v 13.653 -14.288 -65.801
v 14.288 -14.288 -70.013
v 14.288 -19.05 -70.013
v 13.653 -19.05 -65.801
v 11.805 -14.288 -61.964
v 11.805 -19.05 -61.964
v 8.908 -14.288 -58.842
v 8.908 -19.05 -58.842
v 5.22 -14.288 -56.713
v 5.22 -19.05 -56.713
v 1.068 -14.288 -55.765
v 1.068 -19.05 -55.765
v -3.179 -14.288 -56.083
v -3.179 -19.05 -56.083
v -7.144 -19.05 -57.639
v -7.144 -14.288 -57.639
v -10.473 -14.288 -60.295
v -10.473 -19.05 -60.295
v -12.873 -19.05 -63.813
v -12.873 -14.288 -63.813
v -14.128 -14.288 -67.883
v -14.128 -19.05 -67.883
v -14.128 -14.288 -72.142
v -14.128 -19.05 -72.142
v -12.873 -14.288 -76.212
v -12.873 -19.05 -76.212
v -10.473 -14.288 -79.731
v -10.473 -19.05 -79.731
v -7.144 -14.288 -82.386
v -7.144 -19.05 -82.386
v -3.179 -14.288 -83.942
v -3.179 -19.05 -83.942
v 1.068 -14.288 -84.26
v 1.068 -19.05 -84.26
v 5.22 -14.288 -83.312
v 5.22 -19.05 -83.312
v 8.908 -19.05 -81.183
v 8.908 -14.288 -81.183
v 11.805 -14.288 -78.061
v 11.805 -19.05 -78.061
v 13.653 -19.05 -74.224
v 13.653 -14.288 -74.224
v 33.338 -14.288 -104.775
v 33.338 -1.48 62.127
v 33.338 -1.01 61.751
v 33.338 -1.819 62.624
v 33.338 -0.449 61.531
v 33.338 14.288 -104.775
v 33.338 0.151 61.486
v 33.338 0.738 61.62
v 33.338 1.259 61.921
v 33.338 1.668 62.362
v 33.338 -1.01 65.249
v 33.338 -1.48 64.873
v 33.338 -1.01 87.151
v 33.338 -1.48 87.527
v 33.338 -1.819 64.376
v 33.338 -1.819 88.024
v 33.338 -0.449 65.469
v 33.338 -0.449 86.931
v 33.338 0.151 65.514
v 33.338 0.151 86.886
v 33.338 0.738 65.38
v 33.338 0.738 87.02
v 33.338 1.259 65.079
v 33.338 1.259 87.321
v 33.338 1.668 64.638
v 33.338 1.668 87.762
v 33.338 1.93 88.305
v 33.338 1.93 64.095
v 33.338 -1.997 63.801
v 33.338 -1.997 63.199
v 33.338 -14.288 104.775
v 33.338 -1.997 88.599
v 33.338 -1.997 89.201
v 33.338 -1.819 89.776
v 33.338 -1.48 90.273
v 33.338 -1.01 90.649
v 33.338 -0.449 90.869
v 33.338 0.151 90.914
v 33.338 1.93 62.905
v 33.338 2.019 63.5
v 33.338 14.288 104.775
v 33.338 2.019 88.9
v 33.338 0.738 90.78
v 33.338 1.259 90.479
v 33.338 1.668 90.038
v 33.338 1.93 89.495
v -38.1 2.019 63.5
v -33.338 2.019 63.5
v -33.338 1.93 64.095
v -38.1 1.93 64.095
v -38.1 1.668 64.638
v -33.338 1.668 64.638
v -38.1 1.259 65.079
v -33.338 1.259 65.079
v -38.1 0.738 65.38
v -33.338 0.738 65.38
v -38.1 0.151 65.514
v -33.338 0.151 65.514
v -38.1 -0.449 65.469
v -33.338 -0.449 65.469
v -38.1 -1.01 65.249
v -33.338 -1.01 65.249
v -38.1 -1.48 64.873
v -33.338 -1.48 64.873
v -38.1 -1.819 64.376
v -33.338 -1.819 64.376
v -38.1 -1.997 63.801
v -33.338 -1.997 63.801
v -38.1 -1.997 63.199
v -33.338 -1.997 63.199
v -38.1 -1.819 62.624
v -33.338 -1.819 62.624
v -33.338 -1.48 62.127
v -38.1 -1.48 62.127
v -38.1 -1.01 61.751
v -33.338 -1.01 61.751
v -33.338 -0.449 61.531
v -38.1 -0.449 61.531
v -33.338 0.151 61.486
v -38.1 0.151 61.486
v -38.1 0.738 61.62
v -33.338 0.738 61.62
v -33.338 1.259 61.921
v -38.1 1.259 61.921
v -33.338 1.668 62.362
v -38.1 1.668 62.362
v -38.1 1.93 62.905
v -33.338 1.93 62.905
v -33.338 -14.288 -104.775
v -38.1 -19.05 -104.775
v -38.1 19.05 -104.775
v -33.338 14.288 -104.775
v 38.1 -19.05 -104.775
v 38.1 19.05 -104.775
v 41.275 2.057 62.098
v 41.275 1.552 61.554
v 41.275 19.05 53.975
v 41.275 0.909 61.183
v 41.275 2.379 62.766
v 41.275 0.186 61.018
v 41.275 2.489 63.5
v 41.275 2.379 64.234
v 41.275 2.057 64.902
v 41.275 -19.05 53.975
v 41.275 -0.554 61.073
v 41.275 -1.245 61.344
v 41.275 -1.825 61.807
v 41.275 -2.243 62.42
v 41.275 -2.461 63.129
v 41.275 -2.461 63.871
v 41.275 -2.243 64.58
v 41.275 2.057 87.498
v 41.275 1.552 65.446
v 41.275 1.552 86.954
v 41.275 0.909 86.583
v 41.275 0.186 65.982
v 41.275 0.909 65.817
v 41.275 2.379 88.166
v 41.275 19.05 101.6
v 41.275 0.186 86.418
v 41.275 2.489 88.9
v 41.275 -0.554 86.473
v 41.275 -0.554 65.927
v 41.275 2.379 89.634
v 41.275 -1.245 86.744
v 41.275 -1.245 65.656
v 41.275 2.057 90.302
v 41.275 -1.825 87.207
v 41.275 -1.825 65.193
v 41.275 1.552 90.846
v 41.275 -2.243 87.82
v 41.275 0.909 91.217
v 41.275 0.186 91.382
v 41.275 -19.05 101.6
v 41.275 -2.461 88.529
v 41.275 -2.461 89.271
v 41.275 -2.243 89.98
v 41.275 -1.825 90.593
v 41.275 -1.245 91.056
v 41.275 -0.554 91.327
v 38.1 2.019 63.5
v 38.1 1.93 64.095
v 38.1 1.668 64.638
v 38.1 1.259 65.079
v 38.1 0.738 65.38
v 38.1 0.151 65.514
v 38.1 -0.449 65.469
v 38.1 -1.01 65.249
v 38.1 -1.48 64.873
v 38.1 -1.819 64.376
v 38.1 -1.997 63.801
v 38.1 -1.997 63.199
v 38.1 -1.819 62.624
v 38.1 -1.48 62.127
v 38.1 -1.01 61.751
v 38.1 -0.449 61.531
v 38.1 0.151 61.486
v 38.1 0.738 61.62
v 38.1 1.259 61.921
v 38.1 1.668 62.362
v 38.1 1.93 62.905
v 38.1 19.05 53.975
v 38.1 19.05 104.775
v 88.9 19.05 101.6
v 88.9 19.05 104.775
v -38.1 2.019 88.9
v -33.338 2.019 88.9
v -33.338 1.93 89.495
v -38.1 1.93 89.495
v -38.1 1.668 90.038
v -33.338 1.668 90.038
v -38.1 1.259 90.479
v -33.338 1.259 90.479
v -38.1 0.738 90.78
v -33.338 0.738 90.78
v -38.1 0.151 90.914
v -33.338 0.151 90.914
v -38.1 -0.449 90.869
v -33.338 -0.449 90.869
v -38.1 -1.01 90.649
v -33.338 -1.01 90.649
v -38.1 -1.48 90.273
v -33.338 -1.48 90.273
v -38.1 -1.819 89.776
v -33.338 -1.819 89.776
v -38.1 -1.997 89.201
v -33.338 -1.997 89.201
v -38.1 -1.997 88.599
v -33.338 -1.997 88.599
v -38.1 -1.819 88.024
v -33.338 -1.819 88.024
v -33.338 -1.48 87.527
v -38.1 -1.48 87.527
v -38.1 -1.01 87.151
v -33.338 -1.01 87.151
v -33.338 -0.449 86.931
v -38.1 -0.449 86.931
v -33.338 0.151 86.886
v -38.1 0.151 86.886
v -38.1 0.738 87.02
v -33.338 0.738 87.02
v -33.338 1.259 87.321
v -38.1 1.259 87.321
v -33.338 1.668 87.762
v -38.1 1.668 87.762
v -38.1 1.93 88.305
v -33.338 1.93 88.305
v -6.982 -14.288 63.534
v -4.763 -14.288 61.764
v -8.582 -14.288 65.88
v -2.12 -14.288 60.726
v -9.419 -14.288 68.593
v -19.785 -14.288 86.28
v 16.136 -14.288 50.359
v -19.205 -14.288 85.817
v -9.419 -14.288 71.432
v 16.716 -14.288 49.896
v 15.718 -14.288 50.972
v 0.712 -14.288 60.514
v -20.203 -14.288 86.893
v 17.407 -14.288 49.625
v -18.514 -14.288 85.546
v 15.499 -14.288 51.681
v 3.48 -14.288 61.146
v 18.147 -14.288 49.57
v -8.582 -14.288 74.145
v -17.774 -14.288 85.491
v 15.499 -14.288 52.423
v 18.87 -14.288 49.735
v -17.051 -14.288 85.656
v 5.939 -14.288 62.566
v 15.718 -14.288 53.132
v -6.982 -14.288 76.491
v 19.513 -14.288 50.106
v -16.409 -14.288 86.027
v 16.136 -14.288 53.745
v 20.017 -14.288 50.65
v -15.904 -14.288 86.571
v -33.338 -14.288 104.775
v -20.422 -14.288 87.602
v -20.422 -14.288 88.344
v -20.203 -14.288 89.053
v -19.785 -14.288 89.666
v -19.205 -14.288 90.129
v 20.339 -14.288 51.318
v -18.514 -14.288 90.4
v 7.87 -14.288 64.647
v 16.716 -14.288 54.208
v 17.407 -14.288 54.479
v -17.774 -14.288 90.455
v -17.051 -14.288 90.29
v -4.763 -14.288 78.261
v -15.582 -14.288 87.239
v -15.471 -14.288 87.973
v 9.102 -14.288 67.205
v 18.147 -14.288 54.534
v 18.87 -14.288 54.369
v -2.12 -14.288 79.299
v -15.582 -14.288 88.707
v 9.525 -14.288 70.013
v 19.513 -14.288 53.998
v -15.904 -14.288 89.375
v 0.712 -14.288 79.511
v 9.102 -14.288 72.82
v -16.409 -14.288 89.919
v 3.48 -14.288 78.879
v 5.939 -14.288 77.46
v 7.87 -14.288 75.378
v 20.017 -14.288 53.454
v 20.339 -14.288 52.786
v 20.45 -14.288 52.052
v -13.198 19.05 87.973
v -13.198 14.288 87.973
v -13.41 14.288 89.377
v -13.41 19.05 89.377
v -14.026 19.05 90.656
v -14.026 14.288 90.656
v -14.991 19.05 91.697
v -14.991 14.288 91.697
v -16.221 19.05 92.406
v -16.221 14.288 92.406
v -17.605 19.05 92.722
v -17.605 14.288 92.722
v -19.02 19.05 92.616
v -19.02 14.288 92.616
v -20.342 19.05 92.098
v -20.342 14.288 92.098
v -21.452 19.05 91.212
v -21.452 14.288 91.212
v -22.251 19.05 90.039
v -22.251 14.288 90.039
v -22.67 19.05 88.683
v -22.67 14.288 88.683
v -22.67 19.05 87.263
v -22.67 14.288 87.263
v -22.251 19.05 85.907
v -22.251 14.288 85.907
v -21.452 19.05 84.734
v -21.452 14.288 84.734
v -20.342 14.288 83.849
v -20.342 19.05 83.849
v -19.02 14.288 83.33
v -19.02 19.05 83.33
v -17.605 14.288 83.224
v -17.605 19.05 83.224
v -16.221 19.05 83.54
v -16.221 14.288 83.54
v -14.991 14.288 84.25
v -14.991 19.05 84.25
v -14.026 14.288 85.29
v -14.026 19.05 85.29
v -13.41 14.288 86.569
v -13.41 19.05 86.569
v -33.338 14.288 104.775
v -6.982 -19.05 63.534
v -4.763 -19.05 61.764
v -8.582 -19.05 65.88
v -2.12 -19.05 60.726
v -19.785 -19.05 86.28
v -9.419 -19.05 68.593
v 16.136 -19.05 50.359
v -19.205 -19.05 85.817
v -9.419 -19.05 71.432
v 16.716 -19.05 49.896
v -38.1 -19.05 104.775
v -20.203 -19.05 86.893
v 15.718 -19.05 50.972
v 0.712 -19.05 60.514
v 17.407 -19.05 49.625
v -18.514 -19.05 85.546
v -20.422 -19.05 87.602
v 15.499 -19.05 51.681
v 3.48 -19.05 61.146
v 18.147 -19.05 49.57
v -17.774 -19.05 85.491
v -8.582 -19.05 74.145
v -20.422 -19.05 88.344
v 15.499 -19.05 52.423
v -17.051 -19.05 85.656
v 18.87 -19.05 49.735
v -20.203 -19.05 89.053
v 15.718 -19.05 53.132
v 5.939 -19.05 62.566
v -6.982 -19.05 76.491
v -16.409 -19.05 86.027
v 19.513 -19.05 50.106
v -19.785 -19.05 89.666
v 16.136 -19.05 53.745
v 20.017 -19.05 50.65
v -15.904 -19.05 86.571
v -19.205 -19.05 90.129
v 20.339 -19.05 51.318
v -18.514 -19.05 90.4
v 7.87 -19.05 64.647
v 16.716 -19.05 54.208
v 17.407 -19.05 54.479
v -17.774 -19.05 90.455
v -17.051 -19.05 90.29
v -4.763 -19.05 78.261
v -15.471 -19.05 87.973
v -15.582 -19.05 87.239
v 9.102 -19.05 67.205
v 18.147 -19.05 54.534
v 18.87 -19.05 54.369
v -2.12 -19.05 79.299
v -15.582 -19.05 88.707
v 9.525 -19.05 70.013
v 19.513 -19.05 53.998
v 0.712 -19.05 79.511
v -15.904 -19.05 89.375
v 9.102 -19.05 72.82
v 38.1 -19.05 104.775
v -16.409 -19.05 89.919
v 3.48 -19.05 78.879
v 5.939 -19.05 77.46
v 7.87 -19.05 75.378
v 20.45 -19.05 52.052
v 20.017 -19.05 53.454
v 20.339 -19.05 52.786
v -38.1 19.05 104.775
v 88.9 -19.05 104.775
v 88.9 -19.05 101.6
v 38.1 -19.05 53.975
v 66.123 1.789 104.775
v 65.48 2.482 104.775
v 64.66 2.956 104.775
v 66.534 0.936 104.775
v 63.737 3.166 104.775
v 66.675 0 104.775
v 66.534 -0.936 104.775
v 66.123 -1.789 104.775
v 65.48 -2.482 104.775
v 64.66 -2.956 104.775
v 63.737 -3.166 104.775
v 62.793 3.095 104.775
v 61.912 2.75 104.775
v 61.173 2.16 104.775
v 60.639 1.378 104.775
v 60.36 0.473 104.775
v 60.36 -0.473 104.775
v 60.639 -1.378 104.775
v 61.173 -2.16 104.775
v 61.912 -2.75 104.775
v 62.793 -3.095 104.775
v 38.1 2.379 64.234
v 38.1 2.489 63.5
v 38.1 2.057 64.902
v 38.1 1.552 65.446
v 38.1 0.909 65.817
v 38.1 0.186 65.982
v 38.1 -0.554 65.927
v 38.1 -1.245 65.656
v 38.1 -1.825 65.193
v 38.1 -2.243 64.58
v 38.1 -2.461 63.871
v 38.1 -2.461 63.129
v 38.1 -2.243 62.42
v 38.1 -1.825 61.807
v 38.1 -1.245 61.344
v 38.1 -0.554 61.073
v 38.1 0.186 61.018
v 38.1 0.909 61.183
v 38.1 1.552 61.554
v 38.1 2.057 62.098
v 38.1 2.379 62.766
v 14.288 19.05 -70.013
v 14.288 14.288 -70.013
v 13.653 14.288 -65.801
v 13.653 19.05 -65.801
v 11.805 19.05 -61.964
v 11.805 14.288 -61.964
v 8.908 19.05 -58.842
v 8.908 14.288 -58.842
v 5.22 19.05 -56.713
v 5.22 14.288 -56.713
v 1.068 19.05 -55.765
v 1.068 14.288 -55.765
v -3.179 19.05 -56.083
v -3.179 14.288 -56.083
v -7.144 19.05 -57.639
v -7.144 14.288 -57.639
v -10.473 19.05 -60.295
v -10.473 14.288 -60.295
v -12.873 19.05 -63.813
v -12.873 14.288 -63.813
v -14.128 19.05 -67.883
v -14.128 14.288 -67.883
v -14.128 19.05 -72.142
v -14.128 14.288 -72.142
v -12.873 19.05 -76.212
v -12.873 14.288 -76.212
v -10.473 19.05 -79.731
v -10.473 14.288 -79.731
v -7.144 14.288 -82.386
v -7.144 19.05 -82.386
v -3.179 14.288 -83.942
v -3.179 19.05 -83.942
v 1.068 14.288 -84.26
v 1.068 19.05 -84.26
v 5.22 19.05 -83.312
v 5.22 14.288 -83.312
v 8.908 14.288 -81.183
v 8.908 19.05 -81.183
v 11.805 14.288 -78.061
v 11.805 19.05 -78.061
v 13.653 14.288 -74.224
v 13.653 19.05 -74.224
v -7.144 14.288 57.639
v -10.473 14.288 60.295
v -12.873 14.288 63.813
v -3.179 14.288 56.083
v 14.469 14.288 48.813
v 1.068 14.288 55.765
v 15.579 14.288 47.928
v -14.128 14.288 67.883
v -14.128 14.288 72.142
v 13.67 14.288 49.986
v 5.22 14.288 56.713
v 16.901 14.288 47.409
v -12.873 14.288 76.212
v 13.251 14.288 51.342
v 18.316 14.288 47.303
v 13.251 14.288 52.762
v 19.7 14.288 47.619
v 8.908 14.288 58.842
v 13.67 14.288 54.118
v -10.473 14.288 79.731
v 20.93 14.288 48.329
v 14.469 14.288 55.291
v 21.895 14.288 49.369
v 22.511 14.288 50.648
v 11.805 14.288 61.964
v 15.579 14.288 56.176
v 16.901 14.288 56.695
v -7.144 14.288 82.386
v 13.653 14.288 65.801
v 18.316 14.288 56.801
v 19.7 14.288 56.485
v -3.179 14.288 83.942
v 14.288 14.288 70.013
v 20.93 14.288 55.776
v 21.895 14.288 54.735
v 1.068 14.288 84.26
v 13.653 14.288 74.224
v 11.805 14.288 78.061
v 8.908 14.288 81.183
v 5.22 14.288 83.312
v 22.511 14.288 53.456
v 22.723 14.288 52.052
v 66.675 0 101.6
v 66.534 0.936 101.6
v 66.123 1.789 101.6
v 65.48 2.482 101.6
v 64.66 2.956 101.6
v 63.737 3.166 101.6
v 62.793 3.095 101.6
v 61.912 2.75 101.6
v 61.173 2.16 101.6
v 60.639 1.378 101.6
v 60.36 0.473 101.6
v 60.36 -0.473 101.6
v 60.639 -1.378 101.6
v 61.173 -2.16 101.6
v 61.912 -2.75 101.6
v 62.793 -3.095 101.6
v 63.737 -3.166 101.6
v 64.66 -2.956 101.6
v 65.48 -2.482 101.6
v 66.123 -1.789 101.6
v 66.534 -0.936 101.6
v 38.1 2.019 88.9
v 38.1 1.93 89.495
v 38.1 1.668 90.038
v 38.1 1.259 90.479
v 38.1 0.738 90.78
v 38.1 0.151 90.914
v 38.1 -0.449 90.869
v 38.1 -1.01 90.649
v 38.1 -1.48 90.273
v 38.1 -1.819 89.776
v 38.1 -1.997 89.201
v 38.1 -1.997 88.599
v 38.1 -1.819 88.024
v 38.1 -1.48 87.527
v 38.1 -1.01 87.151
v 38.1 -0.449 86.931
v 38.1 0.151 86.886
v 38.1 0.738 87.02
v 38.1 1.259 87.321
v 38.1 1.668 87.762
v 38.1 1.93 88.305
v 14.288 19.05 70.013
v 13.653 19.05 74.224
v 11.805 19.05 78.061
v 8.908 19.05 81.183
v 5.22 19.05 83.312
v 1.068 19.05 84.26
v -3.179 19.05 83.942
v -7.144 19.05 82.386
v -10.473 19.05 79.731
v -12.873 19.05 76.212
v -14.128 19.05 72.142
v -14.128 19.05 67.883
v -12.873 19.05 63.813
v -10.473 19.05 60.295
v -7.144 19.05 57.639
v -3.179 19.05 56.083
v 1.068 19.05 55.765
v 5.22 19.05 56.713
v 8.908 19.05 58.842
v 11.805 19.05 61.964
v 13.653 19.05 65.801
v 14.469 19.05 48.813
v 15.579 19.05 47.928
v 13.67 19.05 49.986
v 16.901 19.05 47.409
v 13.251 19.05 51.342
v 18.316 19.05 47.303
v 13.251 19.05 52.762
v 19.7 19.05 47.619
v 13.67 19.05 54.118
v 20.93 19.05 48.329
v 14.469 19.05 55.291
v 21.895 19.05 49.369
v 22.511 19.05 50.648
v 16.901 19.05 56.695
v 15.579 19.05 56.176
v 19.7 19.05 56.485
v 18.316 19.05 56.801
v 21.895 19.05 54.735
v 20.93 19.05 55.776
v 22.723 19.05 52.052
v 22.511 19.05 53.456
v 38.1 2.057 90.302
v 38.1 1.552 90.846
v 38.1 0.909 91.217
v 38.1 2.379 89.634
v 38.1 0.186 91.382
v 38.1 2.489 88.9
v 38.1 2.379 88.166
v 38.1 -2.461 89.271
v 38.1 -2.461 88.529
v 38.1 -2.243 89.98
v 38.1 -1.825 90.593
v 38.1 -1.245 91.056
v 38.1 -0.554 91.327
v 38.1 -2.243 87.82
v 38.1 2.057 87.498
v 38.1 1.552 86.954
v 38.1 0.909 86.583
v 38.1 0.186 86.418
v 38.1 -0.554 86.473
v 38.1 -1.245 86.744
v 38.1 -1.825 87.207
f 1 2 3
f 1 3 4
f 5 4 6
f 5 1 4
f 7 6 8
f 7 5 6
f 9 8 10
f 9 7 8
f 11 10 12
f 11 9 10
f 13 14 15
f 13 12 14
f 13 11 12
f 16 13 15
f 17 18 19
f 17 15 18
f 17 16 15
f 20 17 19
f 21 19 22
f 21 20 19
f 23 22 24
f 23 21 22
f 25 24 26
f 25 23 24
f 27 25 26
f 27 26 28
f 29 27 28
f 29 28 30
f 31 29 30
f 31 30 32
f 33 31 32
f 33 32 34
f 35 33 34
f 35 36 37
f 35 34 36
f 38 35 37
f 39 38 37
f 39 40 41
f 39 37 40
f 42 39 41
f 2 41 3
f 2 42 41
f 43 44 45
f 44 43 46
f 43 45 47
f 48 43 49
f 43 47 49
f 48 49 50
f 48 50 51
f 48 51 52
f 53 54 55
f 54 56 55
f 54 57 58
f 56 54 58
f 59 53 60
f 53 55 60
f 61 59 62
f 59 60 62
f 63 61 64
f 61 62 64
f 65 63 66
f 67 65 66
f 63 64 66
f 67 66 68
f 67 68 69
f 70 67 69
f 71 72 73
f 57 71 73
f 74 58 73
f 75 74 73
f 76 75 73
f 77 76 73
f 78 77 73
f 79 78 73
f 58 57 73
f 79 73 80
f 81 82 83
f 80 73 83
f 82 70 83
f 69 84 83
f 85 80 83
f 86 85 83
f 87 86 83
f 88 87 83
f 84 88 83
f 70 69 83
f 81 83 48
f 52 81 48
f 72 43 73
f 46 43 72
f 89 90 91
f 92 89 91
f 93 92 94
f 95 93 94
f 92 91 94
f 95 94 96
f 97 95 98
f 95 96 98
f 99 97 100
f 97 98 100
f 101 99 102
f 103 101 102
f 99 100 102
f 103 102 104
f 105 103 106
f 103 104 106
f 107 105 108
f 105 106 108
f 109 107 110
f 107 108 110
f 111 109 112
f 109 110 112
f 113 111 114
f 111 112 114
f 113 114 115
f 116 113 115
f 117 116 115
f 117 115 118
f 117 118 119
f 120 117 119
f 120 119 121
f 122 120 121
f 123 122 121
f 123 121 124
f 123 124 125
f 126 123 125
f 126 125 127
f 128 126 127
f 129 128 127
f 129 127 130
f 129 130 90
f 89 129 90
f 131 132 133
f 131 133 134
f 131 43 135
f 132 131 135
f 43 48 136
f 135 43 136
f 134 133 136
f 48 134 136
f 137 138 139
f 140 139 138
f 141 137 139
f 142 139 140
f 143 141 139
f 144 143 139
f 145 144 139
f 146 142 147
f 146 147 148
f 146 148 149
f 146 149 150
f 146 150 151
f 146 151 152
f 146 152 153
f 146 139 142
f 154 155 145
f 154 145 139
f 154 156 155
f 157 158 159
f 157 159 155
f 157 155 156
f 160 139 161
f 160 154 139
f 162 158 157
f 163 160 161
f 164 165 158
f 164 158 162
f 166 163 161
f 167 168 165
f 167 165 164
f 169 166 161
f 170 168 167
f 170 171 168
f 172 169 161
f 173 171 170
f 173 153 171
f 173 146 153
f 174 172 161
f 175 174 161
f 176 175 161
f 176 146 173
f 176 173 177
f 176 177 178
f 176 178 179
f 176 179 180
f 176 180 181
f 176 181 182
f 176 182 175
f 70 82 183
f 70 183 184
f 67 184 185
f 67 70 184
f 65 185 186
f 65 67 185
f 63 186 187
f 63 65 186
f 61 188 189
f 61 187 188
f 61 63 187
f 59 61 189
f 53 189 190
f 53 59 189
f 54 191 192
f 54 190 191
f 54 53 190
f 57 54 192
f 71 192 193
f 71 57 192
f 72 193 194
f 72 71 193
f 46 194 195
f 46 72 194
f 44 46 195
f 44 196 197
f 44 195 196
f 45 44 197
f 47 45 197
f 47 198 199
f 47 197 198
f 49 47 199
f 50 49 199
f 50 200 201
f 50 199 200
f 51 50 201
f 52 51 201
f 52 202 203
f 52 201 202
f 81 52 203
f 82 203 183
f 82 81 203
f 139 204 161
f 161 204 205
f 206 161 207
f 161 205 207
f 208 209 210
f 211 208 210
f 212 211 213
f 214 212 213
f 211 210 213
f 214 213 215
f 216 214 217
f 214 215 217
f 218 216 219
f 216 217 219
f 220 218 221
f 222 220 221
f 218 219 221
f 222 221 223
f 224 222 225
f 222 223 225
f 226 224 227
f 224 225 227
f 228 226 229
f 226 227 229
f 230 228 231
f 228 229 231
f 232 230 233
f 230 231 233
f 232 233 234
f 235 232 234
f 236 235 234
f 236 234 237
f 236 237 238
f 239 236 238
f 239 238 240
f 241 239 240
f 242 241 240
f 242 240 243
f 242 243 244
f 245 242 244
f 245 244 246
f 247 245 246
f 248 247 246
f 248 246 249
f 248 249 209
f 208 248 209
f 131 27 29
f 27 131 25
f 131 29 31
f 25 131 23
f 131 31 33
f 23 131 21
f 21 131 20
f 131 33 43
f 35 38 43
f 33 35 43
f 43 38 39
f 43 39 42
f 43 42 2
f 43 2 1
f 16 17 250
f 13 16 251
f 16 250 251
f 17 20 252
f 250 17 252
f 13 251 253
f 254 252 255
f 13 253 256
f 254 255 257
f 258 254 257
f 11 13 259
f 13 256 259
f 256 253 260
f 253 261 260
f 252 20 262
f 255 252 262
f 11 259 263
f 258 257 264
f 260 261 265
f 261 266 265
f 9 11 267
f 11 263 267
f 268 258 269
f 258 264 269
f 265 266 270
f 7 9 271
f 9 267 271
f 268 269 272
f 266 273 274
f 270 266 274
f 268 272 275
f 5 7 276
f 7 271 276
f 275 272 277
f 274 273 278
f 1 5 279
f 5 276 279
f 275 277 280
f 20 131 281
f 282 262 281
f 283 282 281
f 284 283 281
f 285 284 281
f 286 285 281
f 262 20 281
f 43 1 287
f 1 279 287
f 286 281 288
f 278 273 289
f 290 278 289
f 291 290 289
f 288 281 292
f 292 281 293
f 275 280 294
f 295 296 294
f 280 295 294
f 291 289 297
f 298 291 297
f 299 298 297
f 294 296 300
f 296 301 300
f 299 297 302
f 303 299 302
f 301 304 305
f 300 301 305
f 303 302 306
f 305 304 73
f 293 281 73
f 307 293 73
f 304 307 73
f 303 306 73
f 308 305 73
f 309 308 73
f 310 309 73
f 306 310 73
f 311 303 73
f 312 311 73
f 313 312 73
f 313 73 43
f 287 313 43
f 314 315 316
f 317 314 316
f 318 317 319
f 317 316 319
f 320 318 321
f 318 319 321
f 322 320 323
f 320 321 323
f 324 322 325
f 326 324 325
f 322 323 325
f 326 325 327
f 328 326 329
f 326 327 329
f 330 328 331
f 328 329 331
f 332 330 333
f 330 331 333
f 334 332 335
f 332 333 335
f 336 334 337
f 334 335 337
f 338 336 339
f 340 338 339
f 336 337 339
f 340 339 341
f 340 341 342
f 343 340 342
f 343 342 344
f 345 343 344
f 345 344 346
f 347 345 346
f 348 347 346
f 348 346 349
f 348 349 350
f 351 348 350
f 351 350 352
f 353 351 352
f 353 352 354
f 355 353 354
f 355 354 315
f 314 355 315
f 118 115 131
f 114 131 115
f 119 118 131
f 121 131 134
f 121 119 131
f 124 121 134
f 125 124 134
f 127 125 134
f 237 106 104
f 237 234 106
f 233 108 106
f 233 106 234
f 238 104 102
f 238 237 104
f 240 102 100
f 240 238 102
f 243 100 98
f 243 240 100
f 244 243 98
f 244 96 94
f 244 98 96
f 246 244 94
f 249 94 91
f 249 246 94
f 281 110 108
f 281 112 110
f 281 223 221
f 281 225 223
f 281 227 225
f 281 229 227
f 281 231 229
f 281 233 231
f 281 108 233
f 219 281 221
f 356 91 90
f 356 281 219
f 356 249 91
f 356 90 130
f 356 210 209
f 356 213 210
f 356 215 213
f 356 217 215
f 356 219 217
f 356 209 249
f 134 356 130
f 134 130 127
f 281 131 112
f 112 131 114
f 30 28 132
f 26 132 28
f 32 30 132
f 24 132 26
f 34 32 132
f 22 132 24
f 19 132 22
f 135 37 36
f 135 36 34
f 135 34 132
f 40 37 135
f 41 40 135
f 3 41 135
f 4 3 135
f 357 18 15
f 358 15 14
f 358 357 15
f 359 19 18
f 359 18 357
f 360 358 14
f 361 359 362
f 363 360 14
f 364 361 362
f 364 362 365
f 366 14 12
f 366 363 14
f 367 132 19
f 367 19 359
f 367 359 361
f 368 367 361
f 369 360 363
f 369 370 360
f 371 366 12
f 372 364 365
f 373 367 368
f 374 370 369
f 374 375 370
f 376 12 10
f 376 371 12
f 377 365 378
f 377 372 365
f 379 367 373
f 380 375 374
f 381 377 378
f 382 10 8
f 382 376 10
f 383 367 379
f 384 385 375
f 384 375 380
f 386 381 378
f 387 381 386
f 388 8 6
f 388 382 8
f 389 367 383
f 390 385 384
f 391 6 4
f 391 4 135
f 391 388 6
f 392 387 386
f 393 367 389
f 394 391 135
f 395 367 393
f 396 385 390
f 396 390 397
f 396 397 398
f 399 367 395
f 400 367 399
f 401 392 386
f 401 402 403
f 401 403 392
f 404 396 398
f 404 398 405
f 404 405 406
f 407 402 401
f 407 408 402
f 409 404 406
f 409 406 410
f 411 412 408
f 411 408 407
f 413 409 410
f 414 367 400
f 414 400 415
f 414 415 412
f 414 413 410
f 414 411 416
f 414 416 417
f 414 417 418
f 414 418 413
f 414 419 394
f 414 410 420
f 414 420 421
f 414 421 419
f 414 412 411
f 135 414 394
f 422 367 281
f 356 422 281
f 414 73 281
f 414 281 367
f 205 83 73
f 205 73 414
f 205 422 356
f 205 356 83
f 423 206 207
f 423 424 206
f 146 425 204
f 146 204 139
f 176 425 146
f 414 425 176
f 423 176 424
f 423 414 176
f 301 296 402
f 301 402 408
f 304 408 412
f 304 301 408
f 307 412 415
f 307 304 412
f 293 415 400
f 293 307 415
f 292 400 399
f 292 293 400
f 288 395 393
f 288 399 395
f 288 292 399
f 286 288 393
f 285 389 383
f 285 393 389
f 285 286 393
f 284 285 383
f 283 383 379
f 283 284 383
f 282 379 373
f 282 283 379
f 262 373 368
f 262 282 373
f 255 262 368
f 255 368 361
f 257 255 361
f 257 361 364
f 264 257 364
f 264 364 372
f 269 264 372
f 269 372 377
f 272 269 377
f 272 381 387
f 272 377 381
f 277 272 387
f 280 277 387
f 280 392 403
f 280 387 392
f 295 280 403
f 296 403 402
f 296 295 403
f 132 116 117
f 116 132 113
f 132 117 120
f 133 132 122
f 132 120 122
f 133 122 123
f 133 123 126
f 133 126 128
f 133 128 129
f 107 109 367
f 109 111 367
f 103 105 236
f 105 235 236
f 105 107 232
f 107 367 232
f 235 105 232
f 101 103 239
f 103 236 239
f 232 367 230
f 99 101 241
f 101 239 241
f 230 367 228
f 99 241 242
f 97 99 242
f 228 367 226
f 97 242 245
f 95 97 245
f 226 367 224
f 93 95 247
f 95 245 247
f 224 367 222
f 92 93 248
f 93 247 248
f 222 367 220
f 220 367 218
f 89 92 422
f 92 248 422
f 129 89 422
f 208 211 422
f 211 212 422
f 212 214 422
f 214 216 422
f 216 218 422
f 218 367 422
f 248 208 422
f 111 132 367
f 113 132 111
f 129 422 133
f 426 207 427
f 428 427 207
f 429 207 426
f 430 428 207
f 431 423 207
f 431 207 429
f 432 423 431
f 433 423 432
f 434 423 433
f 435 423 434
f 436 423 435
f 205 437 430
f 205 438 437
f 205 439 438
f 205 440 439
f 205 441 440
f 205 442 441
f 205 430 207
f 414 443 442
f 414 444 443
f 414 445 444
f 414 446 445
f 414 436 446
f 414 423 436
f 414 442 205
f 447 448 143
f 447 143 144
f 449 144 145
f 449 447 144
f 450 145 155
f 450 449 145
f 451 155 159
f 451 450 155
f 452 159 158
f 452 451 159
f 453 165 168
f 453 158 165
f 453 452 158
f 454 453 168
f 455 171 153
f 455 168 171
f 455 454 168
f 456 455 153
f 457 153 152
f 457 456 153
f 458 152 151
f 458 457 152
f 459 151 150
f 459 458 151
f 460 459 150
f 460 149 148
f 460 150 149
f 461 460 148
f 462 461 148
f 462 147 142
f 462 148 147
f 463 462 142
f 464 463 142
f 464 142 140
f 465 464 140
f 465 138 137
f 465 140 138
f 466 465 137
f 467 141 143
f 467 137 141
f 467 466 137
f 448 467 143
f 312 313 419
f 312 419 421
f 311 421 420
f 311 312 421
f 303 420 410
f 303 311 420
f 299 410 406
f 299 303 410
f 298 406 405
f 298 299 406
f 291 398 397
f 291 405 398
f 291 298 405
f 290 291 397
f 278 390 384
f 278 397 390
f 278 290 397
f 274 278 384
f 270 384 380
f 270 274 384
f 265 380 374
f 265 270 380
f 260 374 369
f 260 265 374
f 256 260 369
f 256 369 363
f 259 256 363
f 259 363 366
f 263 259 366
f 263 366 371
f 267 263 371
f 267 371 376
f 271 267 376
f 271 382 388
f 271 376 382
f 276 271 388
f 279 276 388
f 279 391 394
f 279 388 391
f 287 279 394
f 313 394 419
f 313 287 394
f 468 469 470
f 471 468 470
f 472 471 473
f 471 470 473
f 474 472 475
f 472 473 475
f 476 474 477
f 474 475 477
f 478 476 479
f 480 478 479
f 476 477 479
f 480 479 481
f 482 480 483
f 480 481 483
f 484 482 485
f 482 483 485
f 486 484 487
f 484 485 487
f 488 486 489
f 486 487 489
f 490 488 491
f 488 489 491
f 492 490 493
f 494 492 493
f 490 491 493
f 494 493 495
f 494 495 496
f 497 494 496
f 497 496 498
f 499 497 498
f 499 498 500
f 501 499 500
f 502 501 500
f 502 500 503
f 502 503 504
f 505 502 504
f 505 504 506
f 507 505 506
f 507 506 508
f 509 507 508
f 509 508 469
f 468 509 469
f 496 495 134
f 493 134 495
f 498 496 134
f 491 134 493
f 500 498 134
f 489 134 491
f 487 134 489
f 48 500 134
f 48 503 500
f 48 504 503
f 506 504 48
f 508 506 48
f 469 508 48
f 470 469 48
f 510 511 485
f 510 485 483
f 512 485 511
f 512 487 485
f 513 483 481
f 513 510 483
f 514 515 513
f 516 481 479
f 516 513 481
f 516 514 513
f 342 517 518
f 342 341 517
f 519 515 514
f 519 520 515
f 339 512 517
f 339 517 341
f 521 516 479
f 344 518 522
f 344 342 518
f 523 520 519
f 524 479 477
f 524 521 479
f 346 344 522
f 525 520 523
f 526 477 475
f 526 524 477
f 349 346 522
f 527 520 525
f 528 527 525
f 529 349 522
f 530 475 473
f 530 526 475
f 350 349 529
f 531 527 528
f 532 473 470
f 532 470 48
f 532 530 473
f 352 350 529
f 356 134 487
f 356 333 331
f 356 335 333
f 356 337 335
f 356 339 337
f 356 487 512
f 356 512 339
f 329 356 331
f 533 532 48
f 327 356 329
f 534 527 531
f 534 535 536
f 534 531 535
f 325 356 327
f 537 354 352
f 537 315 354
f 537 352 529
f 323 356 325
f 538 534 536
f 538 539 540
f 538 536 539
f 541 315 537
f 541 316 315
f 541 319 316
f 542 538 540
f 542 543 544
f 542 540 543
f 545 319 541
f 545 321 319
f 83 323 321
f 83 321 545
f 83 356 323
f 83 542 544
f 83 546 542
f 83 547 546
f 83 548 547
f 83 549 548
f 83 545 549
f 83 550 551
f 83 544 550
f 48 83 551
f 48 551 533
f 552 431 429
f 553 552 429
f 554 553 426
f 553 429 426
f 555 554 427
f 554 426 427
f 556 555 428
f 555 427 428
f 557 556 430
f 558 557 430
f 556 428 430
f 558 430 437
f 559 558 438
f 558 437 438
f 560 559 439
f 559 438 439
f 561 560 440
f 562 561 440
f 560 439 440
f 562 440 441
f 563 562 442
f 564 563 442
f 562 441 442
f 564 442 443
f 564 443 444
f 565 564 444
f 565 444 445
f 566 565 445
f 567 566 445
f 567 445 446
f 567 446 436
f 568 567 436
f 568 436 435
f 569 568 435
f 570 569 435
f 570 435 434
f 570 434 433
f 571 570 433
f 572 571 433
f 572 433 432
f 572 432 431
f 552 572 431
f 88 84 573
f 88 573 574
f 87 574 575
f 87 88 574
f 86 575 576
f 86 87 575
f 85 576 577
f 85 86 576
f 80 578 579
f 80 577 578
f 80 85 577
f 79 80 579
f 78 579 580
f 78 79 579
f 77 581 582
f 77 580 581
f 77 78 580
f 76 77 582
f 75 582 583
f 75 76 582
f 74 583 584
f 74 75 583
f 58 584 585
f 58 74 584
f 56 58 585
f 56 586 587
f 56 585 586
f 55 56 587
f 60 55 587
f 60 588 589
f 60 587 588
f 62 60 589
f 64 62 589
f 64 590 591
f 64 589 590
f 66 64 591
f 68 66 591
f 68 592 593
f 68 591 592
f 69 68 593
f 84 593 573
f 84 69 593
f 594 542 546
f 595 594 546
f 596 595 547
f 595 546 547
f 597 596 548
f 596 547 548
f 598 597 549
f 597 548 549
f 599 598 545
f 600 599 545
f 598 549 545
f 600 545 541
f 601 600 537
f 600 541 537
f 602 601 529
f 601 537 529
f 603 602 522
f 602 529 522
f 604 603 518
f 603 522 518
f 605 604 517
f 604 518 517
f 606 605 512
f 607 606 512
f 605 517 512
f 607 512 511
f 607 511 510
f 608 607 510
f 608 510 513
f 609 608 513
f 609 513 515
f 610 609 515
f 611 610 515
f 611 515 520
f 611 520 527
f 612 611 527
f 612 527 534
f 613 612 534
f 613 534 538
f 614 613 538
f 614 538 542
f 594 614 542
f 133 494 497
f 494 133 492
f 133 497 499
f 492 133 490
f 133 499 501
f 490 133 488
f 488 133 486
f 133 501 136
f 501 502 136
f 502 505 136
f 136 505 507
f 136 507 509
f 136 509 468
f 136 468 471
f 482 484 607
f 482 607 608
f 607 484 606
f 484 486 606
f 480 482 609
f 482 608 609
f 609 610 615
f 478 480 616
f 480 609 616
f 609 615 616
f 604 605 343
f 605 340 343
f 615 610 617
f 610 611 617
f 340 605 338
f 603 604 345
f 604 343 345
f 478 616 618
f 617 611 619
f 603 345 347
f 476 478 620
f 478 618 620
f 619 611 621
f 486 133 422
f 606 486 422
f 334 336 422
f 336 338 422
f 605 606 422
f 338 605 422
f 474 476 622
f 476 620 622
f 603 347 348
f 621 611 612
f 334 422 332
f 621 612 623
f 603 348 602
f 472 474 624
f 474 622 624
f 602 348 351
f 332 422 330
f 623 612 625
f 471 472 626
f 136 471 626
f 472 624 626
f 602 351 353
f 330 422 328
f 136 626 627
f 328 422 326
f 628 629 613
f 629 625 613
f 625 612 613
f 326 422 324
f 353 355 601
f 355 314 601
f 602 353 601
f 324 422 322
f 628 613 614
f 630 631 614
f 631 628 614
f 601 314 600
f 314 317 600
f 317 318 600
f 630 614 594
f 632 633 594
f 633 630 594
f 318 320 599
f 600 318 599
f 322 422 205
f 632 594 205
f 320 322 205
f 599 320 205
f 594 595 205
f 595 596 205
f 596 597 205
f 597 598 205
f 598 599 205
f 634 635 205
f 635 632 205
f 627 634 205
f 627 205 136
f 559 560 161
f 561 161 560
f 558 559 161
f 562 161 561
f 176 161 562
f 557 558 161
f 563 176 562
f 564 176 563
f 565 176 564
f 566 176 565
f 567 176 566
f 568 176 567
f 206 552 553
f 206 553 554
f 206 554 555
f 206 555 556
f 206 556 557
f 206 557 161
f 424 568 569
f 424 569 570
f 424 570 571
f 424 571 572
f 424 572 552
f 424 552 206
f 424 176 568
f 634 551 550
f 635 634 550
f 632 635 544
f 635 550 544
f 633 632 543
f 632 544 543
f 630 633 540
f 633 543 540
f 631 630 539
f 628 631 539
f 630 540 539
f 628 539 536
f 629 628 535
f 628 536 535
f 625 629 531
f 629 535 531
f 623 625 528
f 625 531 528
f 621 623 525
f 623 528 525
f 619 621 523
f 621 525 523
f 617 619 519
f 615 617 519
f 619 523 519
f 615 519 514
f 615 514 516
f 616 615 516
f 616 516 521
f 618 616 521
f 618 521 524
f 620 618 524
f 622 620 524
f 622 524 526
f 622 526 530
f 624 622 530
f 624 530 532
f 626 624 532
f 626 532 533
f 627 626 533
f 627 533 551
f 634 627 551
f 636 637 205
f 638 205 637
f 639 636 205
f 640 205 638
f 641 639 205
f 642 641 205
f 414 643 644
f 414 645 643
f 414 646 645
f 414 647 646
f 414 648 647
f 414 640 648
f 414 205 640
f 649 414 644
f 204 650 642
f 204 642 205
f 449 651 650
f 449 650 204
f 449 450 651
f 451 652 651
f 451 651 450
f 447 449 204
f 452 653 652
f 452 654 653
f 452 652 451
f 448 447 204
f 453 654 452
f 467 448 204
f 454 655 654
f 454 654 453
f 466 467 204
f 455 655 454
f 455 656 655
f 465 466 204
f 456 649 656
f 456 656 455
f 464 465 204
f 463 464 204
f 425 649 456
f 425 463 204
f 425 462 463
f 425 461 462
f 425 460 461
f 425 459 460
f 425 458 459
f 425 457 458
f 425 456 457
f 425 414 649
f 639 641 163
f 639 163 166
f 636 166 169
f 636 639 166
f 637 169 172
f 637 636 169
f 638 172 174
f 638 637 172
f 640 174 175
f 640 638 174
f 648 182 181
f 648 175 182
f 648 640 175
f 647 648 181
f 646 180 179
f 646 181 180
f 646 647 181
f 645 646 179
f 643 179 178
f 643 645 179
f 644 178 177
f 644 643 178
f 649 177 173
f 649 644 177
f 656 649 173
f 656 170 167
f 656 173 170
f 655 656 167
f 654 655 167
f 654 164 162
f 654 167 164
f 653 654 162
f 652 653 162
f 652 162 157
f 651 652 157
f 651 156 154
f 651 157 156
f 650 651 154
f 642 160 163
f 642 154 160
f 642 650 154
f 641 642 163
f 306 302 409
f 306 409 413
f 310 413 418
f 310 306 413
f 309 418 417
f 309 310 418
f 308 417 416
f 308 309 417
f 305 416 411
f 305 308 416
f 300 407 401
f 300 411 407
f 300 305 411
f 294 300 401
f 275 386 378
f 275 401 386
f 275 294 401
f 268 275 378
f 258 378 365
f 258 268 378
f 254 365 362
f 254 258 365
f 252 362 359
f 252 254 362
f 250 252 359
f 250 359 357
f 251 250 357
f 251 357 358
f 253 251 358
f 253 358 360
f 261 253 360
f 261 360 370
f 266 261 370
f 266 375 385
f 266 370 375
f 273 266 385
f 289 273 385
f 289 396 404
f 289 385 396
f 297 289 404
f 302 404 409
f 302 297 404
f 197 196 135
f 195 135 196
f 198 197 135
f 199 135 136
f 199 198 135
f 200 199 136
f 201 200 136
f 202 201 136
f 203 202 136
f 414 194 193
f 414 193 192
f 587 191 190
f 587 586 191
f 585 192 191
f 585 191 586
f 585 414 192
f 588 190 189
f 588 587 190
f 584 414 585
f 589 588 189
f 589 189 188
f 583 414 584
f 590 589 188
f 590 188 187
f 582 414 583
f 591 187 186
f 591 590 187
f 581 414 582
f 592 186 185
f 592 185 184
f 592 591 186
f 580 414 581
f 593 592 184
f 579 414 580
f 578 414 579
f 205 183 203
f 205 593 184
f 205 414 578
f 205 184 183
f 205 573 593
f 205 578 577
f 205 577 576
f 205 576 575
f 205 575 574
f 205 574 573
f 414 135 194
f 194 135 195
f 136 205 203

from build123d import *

# Parameters (mm, degrees)
F0_W          = 76.2
F0_H          = 38.1
F1_DEPTH      = 104.775
F2_T          = -4.7625
F3_R          = 9.525
F3_R_2        = 2.4892
F3_R_3        = 14.2875
F4_DEPTH      = 19.051
F3_R_4        = 4.7625
F5_DEPTH      = 25.4
F7_DEPTH      = 19.05
F8_R          = 2.0193
F9_DEPTH      = 38.101
F9_DEPTH_BACK = 88.901
F10_R         = 3.175
F11_DEPTH     = 209.551
F8_R_2        = 2.4892
F12_DEPTH     = 88.901


with BuildPart() as f1:
    # F0 (on Top) → F1 (new body, symmetric)
    with BuildSketch(Plane.XY):
        Rectangle(F0_W, F0_H)
    extrude(amount=F1_DEPTH, both=True)

    # F2
    f2_openings = [f1.faces().sort_by_distance(p)[0] for p in [
        (0, 0, 104.775),
        (0, 0, -104.775),
    ]]
    offset(amount=F2_T, openings=f2_openings)

    # F3 (on Front) → F4 (cut, through all)
    with BuildSketch(Plane.XZ):
        with Locations((0, 70.01256)):
            Circle(F3_R)
        with Locations((-17.9605122421, 87.9730722421)):
            Circle(F3_R_2)
        with Locations((17.9605122421, 52.0520477579)):
            Circle(F3_R_2)
        with Locations((0, -70.01256)):
            Circle(F3_R_3)
    extrude(amount=F4_DEPTH, mode=Mode.SUBTRACT)

    # F3 (on Front) → F5 (cut)
    with BuildSketch(Plane.XZ):
        with Locations((0, 70.01256)):
            Circle(F3_R_3)
        with Locations((0, 70.01256)):
            Circle(F3_R, mode=Mode.SUBTRACT)
        with Locations((0, -70.01256)):
            Circle(F3_R_3)
        with Locations((0, 70.01256)):
            Circle(F3_R)
        with Locations((-17.9605122421, 87.9730722421)):
            Circle(F3_R_4)
        with Locations((-17.9605122421, 87.9730722421)):
            Circle(F3_R_2, mode=Mode.SUBTRACT)
        with Locations((17.9605122421, 52.0520477579)):
            Circle(F3_R_4)
        with Locations((17.9605122421, 52.0520477579)):
            Circle(F3_R_2, mode=Mode.SUBTRACT)
        with Locations((-17.9605122421, 87.9730722421)):
            Circle(F3_R_2)
        with Locations((17.9605122421, 52.0520477579)):
            Circle(F3_R_2)
    extrude(amount=-F5_DEPTH, mode=Mode.SUBTRACT)


with BuildPart() as f7:
    # F6 (on Front) → F7 (new body, symmetric)
    with BuildSketch(Plane.XZ):
        Polygon((38.1, 104.775), (38.1, 53.975), (41.275, 53.975), (41.275, 101.6), (88.9, 101.6), (88.9, 104.775), align=None)
    extrude(amount=F7_DEPTH, both=True)


with BuildPart() as f9_tool:
    # F8 (on Right) → F9 (new body, two sides)
    with BuildSketch(Plane.YZ) as f9_sk:
        with Locations((0, 88.9)):
            Circle(F8_R)
        with Locations((0, 63.5)):
            Circle(F8_R)
    extrude(amount=-F9_DEPTH)
    extrude(f9_sk.sketch, amount=F9_DEPTH_BACK)


with BuildPart() as f1_1:
    add(f1.part)

    # F9: cut by f9_tool
    add(f9_tool.part, mode=Mode.SUBTRACT)


with BuildPart() as f7_1:
    add(f7.part)

    # F9: cut by f9_tool
    add(f9_tool.part, mode=Mode.SUBTRACT)

    # F10 (on face) → F11 (cut, through all)
    with BuildSketch(Plane.XY.offset(104.775)):
        with Locations((63.5, 0)):
            Circle(F10_R)
    extrude(amount=-F11_DEPTH, mode=Mode.SUBTRACT)

    # F8 (on Right) → F12 (cut, through all)
    with BuildSketch(Plane.YZ):
        with Locations((0, 88.9)):
            Circle(F8_R_2)
        with Locations((0, 88.9)):
            Circle(F8_R, mode=Mode.SUBTRACT)
        with Locations((0, 63.5)):
            Circle(F8_R_2)
        with Locations((0, 63.5)):
            Circle(F8_R, mode=Mode.SUBTRACT)
        with Locations((0, 88.9)):
            Circle(F8_R)
        with Locations((0, 63.5)):
            Circle(F8_R)
    extrude(amount=F12_DEPTH, mode=Mode.SUBTRACT)


solid = Compound([f1_1.part, f7_1.part])
